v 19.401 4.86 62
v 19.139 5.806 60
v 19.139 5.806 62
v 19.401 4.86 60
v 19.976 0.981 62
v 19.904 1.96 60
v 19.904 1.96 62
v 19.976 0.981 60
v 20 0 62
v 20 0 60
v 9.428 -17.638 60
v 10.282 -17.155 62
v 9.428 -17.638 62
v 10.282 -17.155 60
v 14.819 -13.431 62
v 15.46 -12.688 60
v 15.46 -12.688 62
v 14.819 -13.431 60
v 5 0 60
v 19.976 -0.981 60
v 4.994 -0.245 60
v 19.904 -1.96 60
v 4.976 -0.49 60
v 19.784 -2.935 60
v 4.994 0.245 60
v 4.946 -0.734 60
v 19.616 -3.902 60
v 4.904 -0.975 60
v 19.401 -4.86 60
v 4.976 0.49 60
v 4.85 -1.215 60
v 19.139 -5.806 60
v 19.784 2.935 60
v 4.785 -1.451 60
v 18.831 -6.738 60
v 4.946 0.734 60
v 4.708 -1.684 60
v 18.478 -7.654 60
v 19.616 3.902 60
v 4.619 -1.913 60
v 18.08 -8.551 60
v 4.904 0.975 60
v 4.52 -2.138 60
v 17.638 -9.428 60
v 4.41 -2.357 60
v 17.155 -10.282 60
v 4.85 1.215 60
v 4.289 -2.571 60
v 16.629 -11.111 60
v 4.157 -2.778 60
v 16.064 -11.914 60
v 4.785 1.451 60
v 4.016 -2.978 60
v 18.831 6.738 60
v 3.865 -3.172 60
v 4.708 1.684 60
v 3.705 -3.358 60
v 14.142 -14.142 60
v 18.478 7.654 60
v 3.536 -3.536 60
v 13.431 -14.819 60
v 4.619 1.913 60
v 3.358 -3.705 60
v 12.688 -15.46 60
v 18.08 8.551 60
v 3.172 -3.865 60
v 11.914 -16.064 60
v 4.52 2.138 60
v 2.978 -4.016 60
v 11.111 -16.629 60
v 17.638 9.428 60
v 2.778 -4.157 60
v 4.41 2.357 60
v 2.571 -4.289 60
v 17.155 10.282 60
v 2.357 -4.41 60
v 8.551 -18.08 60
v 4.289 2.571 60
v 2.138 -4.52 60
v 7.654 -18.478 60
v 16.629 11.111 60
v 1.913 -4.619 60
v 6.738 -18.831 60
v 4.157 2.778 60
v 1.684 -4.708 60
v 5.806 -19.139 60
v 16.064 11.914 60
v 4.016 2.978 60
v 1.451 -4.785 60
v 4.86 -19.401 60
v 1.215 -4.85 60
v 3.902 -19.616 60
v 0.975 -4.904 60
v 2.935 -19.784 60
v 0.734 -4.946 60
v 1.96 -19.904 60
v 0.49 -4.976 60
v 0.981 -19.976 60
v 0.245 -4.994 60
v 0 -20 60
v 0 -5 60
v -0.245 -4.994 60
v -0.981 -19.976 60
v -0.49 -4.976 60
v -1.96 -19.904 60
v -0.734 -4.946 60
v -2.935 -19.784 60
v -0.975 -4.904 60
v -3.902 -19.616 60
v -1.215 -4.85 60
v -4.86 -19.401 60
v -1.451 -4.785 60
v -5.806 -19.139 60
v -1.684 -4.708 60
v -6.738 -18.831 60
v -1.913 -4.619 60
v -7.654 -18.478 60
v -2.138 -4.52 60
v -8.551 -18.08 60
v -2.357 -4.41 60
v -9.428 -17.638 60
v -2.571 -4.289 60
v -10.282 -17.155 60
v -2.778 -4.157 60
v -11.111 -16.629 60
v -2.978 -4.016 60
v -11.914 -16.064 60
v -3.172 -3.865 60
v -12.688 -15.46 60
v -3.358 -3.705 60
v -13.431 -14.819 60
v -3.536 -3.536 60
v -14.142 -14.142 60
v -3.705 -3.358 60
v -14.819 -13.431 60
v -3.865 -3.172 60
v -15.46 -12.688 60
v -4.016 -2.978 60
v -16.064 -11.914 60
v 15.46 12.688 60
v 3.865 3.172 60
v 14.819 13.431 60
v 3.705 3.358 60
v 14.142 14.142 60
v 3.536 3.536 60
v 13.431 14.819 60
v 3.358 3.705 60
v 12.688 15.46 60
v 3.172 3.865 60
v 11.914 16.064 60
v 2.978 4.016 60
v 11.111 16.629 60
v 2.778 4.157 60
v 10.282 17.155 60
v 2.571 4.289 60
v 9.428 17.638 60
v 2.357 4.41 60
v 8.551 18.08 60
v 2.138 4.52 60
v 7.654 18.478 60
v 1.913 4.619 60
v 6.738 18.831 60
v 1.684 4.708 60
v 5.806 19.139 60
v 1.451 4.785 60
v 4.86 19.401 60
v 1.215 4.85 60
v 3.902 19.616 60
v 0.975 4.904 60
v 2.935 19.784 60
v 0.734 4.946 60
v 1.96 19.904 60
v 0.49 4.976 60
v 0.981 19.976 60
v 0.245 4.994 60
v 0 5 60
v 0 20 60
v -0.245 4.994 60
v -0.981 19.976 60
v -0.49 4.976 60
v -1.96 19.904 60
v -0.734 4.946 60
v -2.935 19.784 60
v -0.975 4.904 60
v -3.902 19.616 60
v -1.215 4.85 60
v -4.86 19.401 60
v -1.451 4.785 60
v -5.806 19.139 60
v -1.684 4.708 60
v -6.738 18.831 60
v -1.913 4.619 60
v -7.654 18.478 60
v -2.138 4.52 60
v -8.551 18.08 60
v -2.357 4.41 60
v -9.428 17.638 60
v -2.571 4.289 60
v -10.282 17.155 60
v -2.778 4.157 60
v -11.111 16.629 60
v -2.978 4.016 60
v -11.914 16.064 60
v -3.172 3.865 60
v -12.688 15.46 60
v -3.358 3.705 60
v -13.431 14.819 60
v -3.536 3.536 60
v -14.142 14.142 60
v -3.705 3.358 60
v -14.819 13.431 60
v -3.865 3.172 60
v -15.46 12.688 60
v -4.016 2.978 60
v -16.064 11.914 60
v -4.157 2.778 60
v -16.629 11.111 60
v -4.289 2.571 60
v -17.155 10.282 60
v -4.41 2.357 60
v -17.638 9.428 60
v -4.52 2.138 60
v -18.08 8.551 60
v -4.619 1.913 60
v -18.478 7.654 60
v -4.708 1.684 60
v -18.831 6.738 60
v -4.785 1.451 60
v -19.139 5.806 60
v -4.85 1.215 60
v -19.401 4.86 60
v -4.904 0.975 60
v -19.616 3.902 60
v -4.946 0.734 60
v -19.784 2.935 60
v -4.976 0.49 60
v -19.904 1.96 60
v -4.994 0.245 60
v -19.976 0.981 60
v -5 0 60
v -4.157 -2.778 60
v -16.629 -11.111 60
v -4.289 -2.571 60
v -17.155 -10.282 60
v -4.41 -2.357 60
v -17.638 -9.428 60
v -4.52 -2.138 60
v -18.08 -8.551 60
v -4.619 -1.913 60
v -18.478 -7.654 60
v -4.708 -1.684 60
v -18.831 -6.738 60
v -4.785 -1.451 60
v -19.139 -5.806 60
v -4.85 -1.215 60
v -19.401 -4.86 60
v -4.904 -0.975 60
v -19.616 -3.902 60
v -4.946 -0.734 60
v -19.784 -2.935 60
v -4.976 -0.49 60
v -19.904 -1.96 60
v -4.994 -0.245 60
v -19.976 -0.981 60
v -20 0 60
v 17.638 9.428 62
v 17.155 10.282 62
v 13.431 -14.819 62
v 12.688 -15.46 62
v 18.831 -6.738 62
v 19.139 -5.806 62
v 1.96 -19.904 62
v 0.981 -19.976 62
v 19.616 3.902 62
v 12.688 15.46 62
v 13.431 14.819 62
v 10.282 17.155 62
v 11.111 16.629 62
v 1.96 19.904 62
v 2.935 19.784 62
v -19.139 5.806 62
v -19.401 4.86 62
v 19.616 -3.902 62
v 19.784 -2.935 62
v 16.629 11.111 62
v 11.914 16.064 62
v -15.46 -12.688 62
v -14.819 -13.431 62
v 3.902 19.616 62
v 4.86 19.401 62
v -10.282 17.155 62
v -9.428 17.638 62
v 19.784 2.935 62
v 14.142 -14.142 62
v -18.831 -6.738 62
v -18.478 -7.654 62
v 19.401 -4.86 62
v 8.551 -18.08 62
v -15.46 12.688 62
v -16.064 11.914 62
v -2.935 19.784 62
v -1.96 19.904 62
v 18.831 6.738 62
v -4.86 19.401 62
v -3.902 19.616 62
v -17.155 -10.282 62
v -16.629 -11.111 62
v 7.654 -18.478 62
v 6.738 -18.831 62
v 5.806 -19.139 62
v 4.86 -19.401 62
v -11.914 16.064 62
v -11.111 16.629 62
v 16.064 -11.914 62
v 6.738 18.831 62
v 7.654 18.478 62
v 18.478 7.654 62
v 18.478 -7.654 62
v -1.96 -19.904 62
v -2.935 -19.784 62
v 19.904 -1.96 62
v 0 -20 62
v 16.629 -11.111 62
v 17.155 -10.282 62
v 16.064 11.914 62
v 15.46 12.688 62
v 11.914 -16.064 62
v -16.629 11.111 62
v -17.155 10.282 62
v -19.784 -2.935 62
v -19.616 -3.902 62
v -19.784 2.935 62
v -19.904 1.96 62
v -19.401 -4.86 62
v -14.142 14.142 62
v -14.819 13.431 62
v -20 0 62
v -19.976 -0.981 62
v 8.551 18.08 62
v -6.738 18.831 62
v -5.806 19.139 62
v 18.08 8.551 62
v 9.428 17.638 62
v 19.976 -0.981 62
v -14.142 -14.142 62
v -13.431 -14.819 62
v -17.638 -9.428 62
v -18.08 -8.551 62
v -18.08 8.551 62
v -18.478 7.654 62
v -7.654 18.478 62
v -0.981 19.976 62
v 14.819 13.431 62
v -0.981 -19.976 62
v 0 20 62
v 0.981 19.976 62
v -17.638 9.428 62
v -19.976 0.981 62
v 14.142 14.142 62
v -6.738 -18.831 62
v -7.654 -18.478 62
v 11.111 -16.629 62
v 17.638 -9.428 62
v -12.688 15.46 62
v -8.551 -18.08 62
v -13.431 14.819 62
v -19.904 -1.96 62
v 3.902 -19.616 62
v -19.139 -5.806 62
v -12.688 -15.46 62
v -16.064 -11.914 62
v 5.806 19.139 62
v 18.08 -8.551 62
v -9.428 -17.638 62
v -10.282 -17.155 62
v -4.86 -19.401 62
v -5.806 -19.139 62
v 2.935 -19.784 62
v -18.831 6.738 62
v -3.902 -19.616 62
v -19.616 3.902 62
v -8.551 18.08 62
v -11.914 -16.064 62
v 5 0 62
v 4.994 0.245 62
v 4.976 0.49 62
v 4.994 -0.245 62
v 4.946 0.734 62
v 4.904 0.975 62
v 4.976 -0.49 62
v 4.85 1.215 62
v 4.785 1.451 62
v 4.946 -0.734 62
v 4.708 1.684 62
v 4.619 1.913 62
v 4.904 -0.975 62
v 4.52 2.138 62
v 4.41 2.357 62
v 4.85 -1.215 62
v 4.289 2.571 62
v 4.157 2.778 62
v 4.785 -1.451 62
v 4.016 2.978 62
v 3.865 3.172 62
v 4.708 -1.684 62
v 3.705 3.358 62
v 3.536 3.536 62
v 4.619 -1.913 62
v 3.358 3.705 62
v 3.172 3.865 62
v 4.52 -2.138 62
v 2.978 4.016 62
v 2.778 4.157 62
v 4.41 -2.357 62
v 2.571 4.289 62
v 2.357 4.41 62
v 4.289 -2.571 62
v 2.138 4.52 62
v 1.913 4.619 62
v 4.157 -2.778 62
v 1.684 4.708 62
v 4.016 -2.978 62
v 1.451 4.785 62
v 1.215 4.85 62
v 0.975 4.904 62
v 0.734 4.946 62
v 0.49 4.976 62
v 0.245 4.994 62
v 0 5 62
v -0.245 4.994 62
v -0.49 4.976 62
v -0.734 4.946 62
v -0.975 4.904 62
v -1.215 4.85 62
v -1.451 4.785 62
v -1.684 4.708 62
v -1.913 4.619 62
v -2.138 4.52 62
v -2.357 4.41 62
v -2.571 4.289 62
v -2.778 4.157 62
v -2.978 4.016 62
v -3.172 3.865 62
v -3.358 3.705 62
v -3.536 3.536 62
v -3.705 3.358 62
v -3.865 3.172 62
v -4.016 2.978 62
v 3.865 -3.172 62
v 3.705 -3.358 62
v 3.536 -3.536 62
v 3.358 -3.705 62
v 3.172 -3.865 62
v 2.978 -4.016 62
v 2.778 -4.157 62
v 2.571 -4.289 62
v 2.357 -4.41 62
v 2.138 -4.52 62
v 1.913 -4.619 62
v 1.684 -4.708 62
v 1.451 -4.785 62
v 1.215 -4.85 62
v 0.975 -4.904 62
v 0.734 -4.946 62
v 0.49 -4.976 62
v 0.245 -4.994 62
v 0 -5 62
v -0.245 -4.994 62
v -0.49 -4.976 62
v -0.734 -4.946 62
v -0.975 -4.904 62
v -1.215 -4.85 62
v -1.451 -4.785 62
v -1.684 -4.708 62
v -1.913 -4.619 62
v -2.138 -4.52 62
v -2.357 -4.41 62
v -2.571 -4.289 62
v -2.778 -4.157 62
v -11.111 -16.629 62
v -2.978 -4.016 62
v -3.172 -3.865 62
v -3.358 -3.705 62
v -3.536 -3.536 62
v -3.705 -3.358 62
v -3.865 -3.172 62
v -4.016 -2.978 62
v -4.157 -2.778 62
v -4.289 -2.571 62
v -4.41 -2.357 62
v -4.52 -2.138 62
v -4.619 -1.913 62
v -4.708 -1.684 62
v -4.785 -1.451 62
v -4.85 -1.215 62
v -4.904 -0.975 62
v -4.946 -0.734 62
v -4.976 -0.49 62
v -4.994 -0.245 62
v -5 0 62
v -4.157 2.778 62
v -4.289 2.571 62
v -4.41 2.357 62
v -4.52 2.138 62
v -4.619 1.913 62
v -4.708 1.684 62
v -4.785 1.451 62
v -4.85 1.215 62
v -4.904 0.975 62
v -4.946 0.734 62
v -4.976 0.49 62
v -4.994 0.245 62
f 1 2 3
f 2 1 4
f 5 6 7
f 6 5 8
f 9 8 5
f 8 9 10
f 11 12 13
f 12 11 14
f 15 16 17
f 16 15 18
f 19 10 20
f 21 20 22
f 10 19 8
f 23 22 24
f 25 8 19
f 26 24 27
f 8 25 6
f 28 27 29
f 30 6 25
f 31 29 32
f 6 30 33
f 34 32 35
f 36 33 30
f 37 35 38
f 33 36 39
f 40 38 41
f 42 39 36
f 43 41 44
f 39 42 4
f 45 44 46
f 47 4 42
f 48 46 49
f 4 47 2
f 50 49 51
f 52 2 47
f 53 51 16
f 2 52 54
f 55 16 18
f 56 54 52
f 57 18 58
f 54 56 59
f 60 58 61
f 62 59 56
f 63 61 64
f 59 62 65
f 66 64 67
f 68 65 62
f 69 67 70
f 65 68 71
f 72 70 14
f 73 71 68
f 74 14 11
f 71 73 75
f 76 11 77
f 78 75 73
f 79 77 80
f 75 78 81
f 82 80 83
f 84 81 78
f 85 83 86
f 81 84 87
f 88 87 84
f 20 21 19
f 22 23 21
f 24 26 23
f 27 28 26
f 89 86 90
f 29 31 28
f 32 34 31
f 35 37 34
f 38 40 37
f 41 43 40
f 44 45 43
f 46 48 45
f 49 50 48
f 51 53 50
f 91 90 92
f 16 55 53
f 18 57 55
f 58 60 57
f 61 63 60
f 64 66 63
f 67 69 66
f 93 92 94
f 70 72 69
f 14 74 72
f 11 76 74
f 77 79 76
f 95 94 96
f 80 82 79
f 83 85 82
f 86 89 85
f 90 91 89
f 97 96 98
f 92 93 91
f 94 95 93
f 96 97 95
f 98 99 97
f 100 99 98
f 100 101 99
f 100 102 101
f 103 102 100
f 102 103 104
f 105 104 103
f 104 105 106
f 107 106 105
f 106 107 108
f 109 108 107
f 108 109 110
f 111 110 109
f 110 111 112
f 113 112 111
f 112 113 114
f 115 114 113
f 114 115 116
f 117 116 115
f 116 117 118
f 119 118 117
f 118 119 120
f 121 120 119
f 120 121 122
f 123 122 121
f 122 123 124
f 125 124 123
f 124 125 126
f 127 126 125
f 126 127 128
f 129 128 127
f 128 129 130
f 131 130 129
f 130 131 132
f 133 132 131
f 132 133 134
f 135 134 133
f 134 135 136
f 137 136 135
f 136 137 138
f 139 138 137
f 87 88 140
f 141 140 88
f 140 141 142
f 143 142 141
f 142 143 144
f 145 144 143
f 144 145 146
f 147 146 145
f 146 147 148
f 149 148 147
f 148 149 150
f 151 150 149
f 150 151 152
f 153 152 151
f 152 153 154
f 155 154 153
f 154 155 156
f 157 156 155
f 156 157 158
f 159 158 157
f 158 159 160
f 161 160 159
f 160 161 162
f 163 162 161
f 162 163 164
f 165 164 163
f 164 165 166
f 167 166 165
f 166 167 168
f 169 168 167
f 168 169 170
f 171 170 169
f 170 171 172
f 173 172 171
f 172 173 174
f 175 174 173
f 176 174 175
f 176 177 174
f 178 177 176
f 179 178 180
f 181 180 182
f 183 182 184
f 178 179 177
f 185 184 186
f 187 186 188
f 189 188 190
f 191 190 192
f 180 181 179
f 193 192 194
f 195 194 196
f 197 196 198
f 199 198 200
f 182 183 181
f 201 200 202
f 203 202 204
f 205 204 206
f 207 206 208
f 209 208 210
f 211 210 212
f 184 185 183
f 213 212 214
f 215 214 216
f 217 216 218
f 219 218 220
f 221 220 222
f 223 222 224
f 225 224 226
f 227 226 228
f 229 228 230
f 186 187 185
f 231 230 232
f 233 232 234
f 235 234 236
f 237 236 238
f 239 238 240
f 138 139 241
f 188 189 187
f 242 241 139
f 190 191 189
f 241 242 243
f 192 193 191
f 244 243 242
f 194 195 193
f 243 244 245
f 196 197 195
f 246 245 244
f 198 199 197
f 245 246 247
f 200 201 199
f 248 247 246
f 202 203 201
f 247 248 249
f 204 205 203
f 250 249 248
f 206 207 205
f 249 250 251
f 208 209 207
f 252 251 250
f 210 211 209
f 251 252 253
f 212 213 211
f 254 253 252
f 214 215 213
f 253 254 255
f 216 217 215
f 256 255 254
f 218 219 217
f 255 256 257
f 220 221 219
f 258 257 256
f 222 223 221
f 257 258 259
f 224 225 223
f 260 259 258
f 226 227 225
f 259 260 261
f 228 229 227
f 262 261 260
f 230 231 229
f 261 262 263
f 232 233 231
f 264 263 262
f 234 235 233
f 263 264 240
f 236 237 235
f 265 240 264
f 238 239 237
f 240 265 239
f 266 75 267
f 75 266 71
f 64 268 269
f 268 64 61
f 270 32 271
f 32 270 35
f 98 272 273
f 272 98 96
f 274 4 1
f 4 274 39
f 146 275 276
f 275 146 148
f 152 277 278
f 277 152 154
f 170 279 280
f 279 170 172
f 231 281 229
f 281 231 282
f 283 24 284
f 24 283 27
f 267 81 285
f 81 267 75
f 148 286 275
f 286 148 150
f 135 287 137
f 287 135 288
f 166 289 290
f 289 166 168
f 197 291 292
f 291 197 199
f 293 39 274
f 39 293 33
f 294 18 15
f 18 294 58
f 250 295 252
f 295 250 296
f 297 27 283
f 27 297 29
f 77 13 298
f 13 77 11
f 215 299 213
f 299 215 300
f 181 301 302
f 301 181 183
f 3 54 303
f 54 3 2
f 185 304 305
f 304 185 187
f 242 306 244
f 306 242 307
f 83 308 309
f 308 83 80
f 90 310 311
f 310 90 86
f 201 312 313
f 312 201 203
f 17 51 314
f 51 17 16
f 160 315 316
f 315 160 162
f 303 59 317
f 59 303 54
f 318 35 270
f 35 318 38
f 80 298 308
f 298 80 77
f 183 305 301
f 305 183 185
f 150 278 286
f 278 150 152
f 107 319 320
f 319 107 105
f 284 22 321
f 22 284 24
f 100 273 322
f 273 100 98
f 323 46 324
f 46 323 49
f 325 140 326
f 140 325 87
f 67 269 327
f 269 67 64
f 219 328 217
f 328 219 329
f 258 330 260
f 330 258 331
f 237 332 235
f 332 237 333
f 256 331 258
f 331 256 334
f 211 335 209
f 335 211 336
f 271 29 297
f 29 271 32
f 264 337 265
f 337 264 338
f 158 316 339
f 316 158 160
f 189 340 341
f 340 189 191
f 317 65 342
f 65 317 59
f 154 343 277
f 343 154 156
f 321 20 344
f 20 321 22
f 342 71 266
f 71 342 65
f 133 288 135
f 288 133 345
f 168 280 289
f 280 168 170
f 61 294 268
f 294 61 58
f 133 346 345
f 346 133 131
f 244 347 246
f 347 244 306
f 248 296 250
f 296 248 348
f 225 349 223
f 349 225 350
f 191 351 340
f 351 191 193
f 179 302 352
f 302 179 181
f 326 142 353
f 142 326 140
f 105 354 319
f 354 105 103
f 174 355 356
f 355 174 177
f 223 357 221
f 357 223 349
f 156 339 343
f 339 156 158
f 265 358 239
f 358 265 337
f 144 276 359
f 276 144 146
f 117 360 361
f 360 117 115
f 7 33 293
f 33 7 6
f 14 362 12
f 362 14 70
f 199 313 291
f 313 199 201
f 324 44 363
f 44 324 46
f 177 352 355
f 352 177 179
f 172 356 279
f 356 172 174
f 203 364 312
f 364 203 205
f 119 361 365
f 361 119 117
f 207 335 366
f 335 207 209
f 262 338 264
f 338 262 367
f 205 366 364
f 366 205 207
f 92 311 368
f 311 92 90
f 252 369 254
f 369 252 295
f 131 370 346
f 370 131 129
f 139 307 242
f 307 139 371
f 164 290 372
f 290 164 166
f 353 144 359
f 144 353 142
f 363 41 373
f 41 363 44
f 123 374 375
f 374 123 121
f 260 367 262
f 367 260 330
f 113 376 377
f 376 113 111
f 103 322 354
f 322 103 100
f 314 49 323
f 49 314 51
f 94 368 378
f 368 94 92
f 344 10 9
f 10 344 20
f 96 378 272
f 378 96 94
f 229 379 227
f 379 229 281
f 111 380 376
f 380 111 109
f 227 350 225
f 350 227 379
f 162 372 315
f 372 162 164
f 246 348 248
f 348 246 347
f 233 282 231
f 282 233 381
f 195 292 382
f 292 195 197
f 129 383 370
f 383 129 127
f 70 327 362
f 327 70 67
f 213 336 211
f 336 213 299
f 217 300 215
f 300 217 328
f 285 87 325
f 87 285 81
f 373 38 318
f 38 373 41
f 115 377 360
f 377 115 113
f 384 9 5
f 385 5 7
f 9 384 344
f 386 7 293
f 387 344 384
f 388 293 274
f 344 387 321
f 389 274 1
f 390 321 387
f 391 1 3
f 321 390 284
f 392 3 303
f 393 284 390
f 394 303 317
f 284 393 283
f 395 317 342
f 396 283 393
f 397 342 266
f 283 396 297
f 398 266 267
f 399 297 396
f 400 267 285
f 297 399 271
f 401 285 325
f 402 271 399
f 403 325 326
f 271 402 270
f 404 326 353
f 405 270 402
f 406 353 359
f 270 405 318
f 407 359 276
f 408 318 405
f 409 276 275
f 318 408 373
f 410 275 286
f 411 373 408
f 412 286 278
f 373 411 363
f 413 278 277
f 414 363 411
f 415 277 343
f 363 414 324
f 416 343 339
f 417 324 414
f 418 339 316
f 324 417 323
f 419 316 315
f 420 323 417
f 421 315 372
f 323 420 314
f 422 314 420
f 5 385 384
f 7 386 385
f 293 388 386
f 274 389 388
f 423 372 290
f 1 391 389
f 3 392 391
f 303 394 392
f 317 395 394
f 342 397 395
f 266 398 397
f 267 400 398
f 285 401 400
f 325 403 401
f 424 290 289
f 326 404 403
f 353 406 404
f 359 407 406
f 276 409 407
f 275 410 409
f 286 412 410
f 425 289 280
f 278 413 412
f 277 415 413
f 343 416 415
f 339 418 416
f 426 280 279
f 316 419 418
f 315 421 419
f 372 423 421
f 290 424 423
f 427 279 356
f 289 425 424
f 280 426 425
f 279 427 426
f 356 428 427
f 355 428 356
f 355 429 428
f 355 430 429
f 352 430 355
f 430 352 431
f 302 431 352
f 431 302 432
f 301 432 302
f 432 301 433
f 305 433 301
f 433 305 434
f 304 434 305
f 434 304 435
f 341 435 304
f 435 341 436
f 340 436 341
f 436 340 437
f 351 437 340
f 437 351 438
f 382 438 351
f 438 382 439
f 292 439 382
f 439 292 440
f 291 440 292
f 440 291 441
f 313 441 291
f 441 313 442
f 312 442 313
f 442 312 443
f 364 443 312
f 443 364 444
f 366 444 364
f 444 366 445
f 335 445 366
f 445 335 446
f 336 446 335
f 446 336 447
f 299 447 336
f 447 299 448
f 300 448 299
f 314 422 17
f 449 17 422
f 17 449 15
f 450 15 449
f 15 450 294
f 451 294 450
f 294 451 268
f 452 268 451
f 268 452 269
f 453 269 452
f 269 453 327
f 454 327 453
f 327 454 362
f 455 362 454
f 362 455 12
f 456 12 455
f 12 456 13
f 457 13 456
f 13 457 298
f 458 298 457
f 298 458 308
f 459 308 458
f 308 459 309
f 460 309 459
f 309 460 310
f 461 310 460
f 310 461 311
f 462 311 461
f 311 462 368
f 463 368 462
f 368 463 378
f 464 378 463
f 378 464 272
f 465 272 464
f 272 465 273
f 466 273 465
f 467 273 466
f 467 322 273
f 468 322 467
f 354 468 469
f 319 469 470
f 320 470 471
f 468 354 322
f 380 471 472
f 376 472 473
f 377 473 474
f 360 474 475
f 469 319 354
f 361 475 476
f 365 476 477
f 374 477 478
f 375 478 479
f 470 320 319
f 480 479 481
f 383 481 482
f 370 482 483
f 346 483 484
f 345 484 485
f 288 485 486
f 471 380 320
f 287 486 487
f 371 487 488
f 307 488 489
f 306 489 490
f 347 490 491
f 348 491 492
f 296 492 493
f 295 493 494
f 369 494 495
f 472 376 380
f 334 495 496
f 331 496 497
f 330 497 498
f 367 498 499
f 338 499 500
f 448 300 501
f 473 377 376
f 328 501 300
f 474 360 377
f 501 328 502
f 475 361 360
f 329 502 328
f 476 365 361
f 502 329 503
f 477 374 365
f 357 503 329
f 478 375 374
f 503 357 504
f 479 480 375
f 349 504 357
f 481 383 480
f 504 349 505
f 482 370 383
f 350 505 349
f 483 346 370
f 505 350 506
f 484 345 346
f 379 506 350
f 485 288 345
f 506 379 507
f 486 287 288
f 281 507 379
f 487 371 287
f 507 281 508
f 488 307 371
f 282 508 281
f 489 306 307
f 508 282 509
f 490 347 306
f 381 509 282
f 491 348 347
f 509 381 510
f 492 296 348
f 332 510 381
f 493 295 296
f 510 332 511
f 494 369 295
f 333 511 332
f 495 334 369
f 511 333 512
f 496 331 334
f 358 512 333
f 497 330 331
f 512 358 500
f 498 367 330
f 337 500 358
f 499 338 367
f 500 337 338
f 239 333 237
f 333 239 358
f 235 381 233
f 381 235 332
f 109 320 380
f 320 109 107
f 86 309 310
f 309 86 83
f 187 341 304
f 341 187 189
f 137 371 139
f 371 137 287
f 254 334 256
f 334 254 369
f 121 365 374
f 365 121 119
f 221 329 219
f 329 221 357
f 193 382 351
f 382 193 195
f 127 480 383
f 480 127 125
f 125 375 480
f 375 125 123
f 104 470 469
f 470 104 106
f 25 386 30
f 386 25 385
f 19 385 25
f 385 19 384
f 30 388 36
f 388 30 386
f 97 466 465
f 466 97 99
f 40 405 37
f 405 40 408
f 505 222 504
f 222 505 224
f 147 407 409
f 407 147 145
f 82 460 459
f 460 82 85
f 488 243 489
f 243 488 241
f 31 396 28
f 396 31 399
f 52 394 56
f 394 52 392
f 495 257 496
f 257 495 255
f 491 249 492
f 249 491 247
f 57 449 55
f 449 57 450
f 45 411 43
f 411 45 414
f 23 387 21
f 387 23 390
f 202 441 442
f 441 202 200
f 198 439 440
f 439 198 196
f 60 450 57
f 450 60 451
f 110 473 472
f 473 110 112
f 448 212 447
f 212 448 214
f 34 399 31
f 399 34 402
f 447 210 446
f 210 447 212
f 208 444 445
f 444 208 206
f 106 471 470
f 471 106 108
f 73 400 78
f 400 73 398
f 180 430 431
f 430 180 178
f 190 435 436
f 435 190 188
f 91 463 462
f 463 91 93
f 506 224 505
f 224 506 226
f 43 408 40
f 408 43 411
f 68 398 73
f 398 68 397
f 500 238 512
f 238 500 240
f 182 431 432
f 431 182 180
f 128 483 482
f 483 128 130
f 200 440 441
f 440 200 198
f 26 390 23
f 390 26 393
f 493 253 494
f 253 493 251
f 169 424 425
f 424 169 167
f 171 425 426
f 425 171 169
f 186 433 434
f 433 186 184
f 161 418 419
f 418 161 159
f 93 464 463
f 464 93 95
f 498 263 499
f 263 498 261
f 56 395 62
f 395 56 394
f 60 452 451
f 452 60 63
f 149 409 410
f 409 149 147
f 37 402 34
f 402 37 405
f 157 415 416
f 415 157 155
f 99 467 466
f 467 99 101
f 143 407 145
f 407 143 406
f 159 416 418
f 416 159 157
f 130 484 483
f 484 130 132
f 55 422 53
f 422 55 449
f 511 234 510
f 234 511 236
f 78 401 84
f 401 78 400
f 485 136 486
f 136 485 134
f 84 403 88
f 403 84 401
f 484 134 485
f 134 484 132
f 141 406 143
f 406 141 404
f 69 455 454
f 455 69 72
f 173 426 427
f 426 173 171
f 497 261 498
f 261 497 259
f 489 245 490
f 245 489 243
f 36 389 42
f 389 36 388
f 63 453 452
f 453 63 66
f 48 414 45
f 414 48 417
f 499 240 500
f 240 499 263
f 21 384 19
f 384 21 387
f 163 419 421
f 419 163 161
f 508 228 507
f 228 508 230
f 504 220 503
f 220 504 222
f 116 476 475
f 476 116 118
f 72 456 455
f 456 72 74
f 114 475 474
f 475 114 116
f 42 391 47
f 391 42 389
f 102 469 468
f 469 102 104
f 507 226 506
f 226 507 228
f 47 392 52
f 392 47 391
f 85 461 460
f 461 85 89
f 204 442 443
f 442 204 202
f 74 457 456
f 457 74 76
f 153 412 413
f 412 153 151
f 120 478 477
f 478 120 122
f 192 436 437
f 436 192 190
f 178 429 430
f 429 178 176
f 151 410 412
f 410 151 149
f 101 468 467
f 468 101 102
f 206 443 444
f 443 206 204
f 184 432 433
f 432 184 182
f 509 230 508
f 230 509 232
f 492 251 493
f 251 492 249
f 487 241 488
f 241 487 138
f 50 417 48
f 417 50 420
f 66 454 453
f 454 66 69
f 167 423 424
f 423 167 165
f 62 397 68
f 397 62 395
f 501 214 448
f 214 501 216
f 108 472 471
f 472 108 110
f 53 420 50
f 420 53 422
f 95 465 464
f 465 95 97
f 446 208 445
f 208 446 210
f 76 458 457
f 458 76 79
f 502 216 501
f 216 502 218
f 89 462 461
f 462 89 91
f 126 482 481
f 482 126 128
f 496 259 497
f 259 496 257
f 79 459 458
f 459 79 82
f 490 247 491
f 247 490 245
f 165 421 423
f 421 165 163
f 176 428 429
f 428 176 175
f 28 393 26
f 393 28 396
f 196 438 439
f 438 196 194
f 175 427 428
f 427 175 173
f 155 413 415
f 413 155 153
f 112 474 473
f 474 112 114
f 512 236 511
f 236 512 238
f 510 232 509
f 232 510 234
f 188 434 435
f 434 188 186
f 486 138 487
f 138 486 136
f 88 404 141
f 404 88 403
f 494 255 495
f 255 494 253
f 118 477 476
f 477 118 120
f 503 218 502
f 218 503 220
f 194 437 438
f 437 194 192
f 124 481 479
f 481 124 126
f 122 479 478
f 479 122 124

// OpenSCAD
// file: common_params.scad
cylinder_radius = 20.000000;
cylinder_height = 60.000000;
wall_thickness = 2.000000;

cap_thickness = 2.000000;

rod_radius = 2.000000;
rod_height = 50.000000;

ring_outer_radius = 8.000000;
ring_inner_radius = 4.000000;
ring_thickness = 3.000000;
ring_z = 40.000000;

$fn = 128;
// main file
include <common_params.scad>;

hole_radius = 5.000000;

translate([0, 0, cylinder_height])
difference() {
    cylinder(h = cap_thickness, r = cylinder_radius);
    translate([0, 0, -0.1])
        cylinder(h = cap_thickness + 0.2, r = hole_radius);
}
